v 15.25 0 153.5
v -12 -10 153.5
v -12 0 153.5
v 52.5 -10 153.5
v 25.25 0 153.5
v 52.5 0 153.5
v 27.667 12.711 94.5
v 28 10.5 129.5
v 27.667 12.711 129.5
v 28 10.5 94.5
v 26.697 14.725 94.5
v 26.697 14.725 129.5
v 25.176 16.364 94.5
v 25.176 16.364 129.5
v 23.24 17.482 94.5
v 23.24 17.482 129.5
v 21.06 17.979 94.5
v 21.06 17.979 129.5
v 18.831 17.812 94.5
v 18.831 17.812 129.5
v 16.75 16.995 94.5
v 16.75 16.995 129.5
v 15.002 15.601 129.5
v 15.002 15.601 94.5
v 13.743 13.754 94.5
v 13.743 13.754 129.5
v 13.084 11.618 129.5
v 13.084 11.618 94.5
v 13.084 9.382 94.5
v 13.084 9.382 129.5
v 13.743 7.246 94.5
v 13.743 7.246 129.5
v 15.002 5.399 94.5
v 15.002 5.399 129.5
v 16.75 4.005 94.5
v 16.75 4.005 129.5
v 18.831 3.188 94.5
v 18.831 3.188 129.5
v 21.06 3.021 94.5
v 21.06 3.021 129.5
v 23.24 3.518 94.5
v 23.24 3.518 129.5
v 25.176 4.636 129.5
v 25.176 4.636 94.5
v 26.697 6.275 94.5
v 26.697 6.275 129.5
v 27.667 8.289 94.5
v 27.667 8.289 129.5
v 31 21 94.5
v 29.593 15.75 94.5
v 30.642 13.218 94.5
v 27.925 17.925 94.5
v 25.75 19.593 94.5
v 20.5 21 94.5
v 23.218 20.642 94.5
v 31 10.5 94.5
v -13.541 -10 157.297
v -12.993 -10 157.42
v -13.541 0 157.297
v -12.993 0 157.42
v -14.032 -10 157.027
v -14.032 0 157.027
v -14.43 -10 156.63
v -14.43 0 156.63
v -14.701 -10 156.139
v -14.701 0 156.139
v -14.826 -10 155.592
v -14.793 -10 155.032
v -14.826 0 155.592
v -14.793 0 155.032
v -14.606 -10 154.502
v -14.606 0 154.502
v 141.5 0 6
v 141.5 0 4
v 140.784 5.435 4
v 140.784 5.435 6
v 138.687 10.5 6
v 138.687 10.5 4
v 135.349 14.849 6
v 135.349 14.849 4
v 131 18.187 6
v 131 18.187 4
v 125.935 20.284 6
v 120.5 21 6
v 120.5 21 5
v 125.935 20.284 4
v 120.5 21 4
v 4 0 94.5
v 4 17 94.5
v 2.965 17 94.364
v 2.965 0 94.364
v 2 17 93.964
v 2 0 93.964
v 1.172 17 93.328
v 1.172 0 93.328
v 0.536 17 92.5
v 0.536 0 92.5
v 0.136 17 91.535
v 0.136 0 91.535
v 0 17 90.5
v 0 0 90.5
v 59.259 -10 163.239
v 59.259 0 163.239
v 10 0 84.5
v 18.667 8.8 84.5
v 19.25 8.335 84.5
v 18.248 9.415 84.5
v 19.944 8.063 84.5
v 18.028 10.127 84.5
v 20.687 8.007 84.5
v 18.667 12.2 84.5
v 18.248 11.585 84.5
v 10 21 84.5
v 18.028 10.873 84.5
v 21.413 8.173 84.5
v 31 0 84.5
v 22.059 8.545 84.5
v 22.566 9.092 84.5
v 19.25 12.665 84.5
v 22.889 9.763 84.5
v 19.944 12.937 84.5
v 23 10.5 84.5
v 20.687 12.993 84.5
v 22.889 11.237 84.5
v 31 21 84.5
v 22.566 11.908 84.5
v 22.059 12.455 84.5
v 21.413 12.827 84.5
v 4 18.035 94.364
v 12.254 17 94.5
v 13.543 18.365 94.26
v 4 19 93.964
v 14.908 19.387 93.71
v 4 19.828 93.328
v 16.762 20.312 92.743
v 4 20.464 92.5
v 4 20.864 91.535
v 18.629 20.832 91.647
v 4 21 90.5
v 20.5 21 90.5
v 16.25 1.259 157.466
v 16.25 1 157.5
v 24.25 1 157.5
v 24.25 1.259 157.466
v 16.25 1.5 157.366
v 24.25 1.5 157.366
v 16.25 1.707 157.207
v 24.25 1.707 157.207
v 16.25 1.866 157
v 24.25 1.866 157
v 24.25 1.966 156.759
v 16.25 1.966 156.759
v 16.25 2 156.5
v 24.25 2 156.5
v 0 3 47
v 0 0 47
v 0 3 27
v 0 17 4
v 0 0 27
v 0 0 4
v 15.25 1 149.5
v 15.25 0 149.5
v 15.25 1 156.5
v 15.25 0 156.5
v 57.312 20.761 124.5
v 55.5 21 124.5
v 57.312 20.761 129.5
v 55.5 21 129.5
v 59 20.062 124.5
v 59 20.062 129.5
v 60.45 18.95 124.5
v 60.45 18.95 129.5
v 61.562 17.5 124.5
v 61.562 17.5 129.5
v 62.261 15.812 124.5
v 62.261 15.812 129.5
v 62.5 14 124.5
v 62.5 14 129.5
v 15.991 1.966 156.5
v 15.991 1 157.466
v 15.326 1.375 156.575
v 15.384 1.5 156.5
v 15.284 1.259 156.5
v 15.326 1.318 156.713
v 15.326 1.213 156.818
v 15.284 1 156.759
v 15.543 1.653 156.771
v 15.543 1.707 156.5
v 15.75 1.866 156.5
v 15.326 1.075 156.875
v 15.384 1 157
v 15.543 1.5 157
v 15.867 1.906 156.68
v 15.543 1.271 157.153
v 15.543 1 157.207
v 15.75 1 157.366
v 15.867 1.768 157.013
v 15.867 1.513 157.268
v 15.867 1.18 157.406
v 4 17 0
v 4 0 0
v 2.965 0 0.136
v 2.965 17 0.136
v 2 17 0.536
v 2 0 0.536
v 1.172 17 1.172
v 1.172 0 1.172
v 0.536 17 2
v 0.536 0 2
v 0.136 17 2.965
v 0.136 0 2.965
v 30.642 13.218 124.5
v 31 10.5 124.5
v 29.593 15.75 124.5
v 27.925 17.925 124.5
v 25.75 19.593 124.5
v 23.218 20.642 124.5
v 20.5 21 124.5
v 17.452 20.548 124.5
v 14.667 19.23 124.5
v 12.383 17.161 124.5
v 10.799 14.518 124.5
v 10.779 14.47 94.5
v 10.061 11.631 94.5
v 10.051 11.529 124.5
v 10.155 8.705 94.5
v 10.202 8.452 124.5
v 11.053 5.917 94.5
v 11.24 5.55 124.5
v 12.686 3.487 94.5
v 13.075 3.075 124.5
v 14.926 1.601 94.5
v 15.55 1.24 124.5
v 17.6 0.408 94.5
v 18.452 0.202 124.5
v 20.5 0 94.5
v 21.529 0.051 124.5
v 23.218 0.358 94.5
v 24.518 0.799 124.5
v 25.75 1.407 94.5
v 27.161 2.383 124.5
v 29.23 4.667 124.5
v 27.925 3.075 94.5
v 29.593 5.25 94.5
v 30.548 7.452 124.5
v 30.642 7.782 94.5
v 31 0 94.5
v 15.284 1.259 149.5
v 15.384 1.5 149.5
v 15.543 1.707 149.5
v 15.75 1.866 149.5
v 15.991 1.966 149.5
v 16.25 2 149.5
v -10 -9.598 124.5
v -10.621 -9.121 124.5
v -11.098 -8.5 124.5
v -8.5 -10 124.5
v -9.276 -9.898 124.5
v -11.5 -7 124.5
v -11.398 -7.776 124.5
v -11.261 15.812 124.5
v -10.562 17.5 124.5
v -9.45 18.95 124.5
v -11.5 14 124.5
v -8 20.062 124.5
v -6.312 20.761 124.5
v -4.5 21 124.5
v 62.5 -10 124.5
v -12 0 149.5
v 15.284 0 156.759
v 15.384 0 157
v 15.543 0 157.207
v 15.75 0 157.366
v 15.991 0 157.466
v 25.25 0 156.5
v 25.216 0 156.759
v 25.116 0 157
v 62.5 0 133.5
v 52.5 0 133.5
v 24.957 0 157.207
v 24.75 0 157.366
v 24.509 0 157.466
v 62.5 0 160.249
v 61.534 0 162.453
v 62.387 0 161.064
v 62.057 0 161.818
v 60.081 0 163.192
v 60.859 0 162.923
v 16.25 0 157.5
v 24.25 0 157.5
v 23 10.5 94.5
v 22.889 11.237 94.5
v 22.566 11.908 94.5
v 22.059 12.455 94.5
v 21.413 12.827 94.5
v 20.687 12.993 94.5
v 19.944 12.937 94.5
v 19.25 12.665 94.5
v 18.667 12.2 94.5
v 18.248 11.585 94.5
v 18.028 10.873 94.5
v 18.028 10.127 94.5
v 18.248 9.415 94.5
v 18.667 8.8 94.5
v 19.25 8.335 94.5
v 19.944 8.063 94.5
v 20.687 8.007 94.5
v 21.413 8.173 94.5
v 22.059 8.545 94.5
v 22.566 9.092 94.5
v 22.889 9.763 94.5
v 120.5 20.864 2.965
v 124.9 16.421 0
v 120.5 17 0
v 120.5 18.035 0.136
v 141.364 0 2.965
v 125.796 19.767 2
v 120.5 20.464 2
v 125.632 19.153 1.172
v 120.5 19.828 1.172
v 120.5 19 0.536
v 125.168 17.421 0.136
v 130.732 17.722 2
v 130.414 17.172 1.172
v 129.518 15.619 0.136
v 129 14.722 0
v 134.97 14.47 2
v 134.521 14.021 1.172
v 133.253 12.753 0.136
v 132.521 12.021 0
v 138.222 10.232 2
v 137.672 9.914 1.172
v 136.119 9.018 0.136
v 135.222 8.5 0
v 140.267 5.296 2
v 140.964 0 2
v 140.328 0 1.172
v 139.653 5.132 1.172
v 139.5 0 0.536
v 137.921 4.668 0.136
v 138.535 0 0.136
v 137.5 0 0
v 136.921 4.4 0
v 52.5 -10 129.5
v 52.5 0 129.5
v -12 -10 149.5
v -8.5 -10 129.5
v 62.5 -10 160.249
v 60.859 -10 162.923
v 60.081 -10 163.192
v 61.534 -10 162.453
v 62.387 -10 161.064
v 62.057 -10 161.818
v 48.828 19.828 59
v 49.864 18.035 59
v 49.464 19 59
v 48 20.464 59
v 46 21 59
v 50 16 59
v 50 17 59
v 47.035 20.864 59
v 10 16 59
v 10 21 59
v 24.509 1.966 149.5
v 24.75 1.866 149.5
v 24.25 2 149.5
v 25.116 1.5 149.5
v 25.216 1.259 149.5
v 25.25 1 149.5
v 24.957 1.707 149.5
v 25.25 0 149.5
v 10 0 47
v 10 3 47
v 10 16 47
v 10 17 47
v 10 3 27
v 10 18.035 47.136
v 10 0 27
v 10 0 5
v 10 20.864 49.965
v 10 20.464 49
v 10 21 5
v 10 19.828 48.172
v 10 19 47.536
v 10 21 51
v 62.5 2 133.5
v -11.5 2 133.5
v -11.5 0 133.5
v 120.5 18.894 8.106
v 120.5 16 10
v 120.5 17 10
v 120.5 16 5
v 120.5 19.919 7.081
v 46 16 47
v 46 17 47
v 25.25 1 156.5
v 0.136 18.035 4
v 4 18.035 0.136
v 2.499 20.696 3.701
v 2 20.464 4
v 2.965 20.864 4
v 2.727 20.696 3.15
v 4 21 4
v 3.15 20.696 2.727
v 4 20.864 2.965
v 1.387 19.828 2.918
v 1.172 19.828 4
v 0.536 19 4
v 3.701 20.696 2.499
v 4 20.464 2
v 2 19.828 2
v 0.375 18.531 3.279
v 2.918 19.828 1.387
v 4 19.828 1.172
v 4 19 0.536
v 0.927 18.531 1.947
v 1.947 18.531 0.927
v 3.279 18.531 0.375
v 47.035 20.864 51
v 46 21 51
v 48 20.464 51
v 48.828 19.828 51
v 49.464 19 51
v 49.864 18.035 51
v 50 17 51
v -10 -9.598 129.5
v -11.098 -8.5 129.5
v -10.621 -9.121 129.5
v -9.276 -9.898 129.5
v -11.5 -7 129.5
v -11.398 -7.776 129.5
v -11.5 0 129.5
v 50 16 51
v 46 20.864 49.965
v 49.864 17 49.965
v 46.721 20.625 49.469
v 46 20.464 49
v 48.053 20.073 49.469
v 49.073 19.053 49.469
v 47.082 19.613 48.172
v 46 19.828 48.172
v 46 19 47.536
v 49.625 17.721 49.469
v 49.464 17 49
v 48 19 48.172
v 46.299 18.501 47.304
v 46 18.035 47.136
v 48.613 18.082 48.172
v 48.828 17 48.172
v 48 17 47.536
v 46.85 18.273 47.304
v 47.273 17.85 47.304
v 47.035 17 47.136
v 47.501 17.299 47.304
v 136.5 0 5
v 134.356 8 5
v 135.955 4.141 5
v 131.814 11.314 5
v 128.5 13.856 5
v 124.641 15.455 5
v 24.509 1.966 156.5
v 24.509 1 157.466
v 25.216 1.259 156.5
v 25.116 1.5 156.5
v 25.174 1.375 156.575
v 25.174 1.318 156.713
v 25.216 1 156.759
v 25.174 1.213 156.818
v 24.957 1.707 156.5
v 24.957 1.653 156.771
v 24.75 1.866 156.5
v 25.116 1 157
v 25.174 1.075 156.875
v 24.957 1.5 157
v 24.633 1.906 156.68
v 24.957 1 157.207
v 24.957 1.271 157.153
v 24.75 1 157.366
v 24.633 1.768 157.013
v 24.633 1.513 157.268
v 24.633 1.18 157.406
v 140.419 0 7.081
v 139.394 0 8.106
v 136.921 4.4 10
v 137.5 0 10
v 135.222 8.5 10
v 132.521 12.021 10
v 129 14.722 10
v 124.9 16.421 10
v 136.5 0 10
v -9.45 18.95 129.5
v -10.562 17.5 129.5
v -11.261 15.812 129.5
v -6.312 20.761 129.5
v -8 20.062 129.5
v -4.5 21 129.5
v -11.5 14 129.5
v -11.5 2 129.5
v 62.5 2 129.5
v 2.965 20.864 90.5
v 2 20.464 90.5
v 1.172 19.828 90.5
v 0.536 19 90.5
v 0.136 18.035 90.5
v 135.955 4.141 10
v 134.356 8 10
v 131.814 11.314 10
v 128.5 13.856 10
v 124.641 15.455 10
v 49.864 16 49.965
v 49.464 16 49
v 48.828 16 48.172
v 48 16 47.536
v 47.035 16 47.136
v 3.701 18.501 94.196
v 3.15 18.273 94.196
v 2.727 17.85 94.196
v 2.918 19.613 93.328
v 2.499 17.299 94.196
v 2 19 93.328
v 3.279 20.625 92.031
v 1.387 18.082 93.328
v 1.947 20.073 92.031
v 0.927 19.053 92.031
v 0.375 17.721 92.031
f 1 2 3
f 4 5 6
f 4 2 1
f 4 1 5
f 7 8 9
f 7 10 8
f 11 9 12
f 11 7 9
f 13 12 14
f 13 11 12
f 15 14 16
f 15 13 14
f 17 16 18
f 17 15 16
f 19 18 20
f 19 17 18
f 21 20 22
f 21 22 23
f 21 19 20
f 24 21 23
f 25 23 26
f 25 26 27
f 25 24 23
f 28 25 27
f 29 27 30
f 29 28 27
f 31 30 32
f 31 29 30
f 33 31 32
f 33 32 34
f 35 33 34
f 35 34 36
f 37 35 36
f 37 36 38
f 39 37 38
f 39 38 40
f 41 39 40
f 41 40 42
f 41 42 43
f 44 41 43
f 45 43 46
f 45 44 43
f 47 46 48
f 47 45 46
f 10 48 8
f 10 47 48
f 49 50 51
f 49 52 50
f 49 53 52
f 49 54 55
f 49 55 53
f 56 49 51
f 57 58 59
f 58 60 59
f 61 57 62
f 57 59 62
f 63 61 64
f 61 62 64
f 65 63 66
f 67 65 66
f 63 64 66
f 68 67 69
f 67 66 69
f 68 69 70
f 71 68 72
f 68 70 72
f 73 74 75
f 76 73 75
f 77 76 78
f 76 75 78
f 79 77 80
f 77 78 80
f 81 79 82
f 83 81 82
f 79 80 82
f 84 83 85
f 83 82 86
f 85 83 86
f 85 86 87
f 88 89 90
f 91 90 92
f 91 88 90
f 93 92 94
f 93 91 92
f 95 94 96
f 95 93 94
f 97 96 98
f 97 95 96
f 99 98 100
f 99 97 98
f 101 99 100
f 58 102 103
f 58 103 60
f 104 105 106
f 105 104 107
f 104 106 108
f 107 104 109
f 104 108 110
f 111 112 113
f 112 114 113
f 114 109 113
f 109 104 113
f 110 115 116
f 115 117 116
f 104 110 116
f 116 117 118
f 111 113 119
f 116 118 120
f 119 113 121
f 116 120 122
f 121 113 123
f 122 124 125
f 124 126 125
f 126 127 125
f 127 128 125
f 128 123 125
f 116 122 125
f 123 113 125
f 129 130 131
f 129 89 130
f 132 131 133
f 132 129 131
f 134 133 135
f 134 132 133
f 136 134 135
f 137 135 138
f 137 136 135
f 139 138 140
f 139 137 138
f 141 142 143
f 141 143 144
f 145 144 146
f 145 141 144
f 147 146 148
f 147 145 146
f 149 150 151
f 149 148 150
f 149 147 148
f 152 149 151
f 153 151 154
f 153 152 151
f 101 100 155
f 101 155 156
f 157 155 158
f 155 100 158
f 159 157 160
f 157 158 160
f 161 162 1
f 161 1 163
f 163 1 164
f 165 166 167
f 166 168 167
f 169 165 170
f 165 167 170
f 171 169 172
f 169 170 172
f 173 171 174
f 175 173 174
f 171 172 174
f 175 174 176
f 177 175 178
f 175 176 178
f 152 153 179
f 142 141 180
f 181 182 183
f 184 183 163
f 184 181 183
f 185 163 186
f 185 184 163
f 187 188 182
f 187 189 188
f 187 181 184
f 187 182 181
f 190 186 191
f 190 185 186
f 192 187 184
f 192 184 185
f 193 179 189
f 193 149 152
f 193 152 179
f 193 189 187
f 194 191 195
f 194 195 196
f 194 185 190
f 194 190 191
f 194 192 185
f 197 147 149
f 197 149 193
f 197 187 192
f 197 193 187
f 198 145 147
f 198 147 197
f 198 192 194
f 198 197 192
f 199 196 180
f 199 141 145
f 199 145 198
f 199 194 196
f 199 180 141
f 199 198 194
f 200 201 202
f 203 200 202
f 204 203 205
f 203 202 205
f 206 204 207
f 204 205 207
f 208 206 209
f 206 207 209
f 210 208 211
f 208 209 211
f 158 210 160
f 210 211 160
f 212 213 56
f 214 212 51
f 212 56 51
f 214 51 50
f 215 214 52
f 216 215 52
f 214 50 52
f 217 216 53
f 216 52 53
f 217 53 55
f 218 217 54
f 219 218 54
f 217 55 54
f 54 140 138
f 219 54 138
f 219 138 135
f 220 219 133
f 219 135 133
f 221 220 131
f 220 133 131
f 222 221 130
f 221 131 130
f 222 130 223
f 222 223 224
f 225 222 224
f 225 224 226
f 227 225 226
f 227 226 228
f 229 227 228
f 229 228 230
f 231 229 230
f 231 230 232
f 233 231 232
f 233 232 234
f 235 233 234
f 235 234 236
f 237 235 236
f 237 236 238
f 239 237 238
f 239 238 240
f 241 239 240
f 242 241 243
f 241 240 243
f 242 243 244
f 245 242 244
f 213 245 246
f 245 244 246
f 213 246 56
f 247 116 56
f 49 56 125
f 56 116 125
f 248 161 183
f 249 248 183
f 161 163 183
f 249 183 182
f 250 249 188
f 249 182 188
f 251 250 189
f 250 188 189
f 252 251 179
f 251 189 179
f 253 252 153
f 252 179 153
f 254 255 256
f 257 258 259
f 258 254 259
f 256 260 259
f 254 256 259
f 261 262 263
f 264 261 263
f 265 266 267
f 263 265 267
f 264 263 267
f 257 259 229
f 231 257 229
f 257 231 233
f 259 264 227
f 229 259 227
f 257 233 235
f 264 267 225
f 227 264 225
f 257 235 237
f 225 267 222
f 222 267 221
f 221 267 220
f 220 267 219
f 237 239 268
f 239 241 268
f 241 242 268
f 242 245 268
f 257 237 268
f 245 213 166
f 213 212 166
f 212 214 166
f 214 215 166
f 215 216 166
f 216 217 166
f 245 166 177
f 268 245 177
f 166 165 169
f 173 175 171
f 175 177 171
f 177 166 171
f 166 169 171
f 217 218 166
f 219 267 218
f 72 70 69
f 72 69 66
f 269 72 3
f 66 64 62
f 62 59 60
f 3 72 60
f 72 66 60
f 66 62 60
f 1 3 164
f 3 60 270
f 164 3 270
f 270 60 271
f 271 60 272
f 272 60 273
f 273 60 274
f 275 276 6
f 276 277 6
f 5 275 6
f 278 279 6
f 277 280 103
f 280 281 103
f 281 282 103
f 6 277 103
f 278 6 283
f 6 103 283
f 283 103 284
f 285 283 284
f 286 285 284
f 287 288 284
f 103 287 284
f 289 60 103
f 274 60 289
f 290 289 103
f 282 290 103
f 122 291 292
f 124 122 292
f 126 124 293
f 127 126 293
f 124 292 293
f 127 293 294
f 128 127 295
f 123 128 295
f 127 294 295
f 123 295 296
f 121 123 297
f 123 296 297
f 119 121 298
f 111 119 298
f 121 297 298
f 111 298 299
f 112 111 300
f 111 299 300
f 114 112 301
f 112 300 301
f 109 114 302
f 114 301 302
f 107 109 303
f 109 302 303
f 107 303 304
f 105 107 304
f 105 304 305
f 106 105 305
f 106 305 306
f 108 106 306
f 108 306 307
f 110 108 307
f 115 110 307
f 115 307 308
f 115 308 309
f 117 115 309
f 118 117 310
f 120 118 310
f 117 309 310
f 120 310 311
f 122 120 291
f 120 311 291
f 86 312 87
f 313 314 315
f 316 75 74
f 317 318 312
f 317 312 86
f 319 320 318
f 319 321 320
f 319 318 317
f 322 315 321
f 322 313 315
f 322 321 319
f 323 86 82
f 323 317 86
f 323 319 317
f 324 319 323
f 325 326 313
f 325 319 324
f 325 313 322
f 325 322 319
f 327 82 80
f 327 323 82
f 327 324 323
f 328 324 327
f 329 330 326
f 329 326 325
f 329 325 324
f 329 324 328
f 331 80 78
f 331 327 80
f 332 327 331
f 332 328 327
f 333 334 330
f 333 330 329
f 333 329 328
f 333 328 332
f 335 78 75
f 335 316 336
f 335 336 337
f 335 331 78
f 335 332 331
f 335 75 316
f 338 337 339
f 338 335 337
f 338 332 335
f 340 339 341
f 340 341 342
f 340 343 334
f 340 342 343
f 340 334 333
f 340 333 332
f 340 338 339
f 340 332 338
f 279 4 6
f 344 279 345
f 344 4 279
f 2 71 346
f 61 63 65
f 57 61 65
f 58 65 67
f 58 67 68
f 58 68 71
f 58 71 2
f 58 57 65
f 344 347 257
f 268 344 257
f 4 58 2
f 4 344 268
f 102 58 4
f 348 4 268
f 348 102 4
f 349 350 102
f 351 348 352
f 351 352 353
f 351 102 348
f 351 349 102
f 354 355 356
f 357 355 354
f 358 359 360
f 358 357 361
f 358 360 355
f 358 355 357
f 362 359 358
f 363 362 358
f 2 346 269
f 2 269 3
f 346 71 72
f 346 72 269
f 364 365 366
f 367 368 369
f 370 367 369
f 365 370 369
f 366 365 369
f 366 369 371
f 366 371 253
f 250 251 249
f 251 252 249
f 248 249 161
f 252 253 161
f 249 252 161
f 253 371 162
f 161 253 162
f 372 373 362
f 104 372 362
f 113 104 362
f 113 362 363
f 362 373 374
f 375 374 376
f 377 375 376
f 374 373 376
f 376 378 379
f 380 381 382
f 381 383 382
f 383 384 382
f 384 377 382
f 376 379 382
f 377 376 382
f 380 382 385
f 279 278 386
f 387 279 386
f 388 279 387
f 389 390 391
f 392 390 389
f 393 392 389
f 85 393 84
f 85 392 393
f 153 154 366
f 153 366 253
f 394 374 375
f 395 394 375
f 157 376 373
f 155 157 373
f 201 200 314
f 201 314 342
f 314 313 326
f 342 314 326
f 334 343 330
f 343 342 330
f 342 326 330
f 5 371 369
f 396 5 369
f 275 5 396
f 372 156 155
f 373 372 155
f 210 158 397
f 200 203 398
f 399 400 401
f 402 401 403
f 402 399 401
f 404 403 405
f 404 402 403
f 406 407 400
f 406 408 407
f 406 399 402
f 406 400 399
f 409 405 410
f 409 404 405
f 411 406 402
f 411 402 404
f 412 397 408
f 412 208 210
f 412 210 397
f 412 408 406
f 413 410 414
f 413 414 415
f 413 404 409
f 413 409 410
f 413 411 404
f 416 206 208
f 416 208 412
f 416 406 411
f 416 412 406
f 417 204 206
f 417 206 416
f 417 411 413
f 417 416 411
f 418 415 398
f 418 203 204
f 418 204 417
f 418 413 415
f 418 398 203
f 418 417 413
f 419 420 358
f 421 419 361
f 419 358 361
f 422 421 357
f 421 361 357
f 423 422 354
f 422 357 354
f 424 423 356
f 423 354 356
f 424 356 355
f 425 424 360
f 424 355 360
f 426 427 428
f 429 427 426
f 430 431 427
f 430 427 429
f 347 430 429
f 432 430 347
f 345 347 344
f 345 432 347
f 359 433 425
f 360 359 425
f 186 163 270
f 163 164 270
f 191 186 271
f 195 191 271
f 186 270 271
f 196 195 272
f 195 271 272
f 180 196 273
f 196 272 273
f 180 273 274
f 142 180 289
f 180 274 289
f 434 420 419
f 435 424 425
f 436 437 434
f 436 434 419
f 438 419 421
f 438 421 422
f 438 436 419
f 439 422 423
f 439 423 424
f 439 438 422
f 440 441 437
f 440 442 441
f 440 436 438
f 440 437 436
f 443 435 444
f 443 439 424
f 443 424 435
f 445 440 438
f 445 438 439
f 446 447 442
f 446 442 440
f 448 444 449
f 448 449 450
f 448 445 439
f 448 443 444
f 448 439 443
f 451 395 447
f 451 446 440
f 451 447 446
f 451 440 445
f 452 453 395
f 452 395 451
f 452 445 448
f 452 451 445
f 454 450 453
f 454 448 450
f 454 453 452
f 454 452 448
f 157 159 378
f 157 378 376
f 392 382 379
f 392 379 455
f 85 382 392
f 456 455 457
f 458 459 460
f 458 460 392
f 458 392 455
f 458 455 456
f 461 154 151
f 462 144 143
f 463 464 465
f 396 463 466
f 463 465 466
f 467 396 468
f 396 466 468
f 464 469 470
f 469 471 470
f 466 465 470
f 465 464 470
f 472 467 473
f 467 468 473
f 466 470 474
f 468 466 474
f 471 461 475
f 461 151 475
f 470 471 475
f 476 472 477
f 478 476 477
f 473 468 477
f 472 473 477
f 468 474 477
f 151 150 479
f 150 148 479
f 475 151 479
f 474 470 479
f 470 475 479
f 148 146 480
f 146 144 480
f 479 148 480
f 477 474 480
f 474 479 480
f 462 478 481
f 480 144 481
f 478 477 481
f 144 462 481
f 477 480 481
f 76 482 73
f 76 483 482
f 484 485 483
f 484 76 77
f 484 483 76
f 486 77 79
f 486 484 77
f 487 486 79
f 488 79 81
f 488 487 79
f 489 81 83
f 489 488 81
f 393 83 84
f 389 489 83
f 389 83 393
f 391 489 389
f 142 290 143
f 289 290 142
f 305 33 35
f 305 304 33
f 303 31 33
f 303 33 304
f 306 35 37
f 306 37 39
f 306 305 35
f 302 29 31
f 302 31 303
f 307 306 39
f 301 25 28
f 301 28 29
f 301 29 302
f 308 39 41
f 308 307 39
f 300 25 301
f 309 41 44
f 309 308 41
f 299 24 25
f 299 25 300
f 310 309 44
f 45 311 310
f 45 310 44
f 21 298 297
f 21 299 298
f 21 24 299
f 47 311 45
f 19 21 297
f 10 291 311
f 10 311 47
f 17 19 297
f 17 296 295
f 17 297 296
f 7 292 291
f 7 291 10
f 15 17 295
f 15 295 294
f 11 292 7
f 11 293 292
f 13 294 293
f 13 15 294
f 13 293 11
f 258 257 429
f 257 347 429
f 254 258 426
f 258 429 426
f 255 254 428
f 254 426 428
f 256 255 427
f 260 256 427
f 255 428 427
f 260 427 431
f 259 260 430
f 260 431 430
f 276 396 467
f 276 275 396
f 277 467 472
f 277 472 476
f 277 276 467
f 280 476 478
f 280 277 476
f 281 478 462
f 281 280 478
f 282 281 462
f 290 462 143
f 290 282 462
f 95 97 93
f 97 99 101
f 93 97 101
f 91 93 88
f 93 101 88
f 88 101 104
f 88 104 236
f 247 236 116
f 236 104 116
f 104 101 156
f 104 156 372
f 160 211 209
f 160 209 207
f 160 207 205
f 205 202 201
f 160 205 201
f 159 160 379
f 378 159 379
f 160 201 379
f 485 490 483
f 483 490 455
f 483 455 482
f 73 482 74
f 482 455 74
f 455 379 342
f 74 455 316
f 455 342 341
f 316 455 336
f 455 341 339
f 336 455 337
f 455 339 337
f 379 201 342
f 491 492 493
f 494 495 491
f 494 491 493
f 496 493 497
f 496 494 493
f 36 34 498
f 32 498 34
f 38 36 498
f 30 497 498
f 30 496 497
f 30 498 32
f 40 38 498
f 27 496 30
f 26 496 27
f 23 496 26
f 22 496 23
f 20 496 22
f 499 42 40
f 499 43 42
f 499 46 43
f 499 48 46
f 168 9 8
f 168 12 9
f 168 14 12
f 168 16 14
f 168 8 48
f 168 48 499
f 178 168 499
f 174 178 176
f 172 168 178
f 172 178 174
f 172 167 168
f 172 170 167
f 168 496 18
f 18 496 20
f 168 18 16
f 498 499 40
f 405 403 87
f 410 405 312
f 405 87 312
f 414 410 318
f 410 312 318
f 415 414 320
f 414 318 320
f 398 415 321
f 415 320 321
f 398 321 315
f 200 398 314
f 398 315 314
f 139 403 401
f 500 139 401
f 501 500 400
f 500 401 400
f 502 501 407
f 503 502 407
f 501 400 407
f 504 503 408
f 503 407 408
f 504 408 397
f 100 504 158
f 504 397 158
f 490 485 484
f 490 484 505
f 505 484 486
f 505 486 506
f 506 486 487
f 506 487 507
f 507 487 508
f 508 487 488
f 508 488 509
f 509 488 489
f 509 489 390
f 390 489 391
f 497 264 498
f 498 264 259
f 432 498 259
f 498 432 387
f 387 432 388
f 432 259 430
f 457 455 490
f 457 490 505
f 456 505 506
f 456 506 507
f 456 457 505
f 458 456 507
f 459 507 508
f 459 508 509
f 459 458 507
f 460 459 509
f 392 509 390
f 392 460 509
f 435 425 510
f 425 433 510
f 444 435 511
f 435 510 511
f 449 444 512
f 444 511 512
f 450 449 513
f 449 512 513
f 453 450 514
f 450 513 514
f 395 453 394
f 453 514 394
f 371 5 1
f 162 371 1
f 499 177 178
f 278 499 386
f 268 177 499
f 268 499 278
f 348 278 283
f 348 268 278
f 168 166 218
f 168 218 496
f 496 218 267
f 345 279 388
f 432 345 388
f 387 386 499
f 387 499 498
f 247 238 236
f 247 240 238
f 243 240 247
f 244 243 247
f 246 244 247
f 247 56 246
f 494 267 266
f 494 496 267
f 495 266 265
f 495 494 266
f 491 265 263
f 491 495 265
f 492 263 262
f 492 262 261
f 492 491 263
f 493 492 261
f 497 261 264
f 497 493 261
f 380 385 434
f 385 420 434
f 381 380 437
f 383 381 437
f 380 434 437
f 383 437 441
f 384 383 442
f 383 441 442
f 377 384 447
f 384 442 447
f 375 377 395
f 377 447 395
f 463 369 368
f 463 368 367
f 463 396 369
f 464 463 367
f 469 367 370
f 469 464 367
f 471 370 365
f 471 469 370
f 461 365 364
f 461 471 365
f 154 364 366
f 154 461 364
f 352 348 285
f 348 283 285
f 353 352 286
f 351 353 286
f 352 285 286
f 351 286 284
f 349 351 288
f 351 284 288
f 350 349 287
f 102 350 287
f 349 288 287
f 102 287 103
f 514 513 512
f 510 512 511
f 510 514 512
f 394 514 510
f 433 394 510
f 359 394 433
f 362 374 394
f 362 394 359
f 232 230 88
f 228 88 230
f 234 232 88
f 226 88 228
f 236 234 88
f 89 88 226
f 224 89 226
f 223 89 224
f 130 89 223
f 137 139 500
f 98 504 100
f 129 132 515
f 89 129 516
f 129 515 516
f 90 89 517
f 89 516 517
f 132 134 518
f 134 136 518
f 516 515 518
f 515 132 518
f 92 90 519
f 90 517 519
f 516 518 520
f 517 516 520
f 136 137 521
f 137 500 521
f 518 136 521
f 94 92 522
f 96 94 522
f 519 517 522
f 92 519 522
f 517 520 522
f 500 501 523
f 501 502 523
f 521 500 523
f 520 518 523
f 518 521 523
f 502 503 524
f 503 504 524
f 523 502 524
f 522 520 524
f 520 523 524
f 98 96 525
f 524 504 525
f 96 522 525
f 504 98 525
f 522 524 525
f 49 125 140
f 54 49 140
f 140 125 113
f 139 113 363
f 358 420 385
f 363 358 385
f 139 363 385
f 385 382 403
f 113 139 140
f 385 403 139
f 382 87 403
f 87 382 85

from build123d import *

# Parameters (mm, degrees)
PAD_DEPTH       = 5
SKETCH001_W     = 10
SKETCH001_H     = 21
PAD001_DEPTH    = 54
PAD002_DEPTH    = 5
SKETCH004_W     = 5
SKETCH004_H     = 12
PAD003_DEPTH    = 40
SKETCH005_W     = 10
SKETCH005_H     = 21
PAD004_DEPTH    = 25.5
PAD005_DEPTH    = 10
SKETCH007_R     = 2.5
POCKET_DEPTH    = 10
SKETCH008_R     = 10.5
SKETCH008_R_2   = 7.5
PAD006_DEPTH    = 30
CHAMFER_SIZE    = 4
FILLET_R        = 4
FILLET001_R     = 4
FILLET002_R     = 4
SKETCH009_W     = 3
SKETCH009_H     = 20
POCKET001_DEPTH = 10
SKETCH010_R     = 7.5
PAD007_DEPTH    = 5
FILLET003_R     = 4
FILLET004_R     = 4
PAD008_DEPTH    = 10
SKETCH012_W     = 74
SKETCH012_H     = 4
SKETCH012_W_2   = 10
SKETCH012_H_2   = 8
PAD009_DEPTH    = 2
FILLET005_R     = 7
FILLET006_R     = 7
FILLET007_R     = 3
FILLET008_R     = 2
FILLET009_R     = 3
FILLET010_R     = 1
FILLET011_R     = 1
FILLET012_R     = 1


with BuildPart() as part:
    # Sketch → Pad (new body)
    with BuildSketch(Plane.XY):
        with BuildLine():
            Line((0, 21), (0, 0))
            Line((0, 0), (10, 0))
            Line((136.5, 0), (10, 0))
            Line((141.5, 0), (136.5, 0))
            ThreePointArc((141.5, 0), (135.349242, 14.849242), (120.5, 21))
            Line((10, 21), (120.5, 21))
            Line((0, 21), (10, 21))
        make_face()
    extrude(amount=PAD_DEPTH)

    # Sketch001 (on Face4 of Pad) → Pad001 (join)
    with BuildSketch(Plane.XY.offset(5)):
        with Locations((5, 10.5)):
            Rectangle(SKETCH001_W, SKETCH001_H)
    extrude(amount=PAD001_DEPTH)

    # Sketch002 (on Face3 of Pad001) → Pad002 (join)
    with BuildSketch(Plane.XY.offset(5)):
        with BuildLine():
            ThreePointArc((136.5, 0), (131.813708, 11.313708), (120.5, 16))
            Line((120.5, 16), (120.5, 21))
            ThreePointArc((141.5, 0), (135.349242, 14.849242), (120.5, 21))
            Line((136.5, 0), (141.5, 0))
        make_face()
    extrude(amount=PAD002_DEPTH)

    # Sketch004 (on Face5 of Pad002) → Pad003 (join)
    with BuildSketch(Plane.YZ.offset(10)):
        with Locations((18.5, 53)):
            Rectangle(SKETCH004_W, SKETCH004_H)
    extrude(amount=PAD003_DEPTH)

    # Sketch005 (on Face14 of Pad003) → Pad004 (join)
    with BuildSketch(Plane.XY.offset(59)):
        with Locations((5, 10.5)):
            Rectangle(SKETCH005_W, SKETCH005_H)
    extrude(amount=PAD004_DEPTH)

    # Sketch006 (on Face1 of Pad004) → Pad005 (join)
    with BuildSketch(Plane.XY.offset(84.5)):
        Polygon((0, 0), (31, 0), (31, 21), (10, 21), (0, 21), align=None)
    extrude(amount=PAD005_DEPTH)

    # Sketch007 (on Face11 of Pad005) → Pocket (cut)
    with BuildSketch(Plane.XY.offset(94.5)):
        with Locations((20.5, 10.5)):
            Circle(SKETCH007_R)
    extrude(amount=-POCKET_DEPTH, mode=Mode.SUBTRACT)

    # Sketch008 (on Face10 of Pocket) → Pad006 (join)
    with BuildSketch(Plane.XY.offset(94.5)):
        with Locations((20.5, 10.5)):
            Circle(SKETCH008_R)
        with Locations((20.5, 10.5)):
            Circle(SKETCH008_R_2, mode=Mode.SUBTRACT)
    extrude(amount=PAD006_DEPTH)

    # Chamfer
    chamfer_edges = [part.edges().sort_by_distance(p)[0] for p in [
        (135.349242, 14.849242, 10),
    ]]
    chamfer(chamfer_edges, length=CHAMFER_SIZE)

    # Fillet
    fillet_edges = [part.edges().sort_by_distance(p)[0] for p in [
        (50, 21, 53),
    ]]
    fillet(fillet_edges, radius=FILLET_R)

    # Fillet001
    fillet001_edges = [part.edges().sort_by_distance(p)[0] for p in [
        (0, 10.5, 0),
    ]]
    fillet(fillet001_edges, radius=FILLET001_R)

    # Fillet002
    fillet002_edges = [part.edges().sort_by_distance(p)[0] for p in [
        (0, 21, 49.25),
    ]]
    fillet(fillet002_edges, radius=FILLET002_R)

    # Sketch009 (on Face6 of Fillet002) → Pocket001 (cut)
    with BuildSketch(Plane.YZ.offset(10)):
        with Locations((1.5, 37)):
            Rectangle(SKETCH009_W, SKETCH009_H)
    extrude(amount=-POCKET001_DEPTH, mode=Mode.SUBTRACT)

    # Sketch010 (on Face33 of Pocket001) → Pad007 (join)
    with BuildSketch(Plane.XY.offset(124.5)):
        Polygon((-11.5, -10), (52.5, -10), (62.5, -10), (62.5, 21), (52.5, 21), (-11.5, 21), align=None)
        with Locations((20.5, 10.5)):
            Circle(SKETCH010_R, mode=Mode.SUBTRACT)
    extrude(amount=PAD007_DEPTH)

    # Fillet003
    fillet003_edges = [part.edges().sort_by_distance(p)[0] for p in [
        (0, 8.5, 94.5),
    ]]
    fillet(fillet003_edges, radius=FILLET003_R)

    # Fillet004
    fillet004_edges = [part.edges().sort_by_distance(p)[0] for p in [
        (28, 21, 47),
    ]]
    fillet(fillet004_edges, radius=FILLET004_R)

    # Sketch011 (on Face43 of Fillet004) → Pad008 (join)
    with BuildSketch(Plane.XZ.offset(10)):
        Polygon((62.5, 163.5), (-16, 157.177852), (-12, 149.5), (-12, 153.5), (52.5, 153.5), (52.5, 129.5), (62.5, 129.5), (62.5, 153.5), align=None)
    extrude(amount=-PAD008_DEPTH)

    # Sketch012 (on Face45 of Pad008) → Pad009 (join)
    with BuildSketch(Plane(origin=(0, 0, 0), x_dir=(-1, 0, 0), z_dir=(0, 1, 0))):
        with Locations((-25.5, 131.5)):
            Rectangle(SKETCH012_W, SKETCH012_H)
        with Locations((-20.25, 153.5)):
            Rectangle(SKETCH012_W_2, SKETCH012_H_2)
    extrude(amount=PAD009_DEPTH)

    # Fillet005
    fillet005_edges = [part.edges().sort_by_distance(p)[0] for p in [
        (-11.5, 21, 127),
    ]]
    fillet(fillet005_edges, radius=FILLET005_R)

    # Fillet006
    fillet006_edges = [part.edges().sort_by_distance(p)[0] for p in [
        (62.5, 21, 127),
    ]]
    fillet(fillet006_edges, radius=FILLET006_R)

    # Fillet007
    fillet007_edges = [part.edges().sort_by_distance(p)[0] for p in [
        (62.5, -5, 163.5),
    ]]
    fillet(fillet007_edges, radius=FILLET007_R)

    # Fillet008
    fillet008_edges = [part.edges().sort_by_distance(p)[0] for p in [
        (-16, -5, 157.177852),
    ]]
    fillet(fillet008_edges, radius=FILLET008_R)

    # Fillet009
    fillet009_edges = [part.edges().sort_by_distance(p)[0] for p in [
        (-11.5, -10, 127),
    ]]
    fillet(fillet009_edges, radius=FILLET009_R)

    # Fillet010
    fillet010_edges = [part.edges().sort_by_distance(p)[0] for p in [
        (20.25, 2, 157.5),
    ]]
    fillet(fillet010_edges, radius=FILLET010_R)

    # Fillet011
    fillet011_edges = [part.edges().sort_by_distance(p)[0] for p in [
        (15.25, 2, 153),
    ]]
    fillet(fillet011_edges, radius=FILLET011_R)

    # Fillet012
    fillet012_edges = [part.edges().sort_by_distance(p)[0] for p in [
        (25.25, 2, 153),
    ]]
    fillet(fillet012_edges, radius=FILLET012_R)


solid = part.part
